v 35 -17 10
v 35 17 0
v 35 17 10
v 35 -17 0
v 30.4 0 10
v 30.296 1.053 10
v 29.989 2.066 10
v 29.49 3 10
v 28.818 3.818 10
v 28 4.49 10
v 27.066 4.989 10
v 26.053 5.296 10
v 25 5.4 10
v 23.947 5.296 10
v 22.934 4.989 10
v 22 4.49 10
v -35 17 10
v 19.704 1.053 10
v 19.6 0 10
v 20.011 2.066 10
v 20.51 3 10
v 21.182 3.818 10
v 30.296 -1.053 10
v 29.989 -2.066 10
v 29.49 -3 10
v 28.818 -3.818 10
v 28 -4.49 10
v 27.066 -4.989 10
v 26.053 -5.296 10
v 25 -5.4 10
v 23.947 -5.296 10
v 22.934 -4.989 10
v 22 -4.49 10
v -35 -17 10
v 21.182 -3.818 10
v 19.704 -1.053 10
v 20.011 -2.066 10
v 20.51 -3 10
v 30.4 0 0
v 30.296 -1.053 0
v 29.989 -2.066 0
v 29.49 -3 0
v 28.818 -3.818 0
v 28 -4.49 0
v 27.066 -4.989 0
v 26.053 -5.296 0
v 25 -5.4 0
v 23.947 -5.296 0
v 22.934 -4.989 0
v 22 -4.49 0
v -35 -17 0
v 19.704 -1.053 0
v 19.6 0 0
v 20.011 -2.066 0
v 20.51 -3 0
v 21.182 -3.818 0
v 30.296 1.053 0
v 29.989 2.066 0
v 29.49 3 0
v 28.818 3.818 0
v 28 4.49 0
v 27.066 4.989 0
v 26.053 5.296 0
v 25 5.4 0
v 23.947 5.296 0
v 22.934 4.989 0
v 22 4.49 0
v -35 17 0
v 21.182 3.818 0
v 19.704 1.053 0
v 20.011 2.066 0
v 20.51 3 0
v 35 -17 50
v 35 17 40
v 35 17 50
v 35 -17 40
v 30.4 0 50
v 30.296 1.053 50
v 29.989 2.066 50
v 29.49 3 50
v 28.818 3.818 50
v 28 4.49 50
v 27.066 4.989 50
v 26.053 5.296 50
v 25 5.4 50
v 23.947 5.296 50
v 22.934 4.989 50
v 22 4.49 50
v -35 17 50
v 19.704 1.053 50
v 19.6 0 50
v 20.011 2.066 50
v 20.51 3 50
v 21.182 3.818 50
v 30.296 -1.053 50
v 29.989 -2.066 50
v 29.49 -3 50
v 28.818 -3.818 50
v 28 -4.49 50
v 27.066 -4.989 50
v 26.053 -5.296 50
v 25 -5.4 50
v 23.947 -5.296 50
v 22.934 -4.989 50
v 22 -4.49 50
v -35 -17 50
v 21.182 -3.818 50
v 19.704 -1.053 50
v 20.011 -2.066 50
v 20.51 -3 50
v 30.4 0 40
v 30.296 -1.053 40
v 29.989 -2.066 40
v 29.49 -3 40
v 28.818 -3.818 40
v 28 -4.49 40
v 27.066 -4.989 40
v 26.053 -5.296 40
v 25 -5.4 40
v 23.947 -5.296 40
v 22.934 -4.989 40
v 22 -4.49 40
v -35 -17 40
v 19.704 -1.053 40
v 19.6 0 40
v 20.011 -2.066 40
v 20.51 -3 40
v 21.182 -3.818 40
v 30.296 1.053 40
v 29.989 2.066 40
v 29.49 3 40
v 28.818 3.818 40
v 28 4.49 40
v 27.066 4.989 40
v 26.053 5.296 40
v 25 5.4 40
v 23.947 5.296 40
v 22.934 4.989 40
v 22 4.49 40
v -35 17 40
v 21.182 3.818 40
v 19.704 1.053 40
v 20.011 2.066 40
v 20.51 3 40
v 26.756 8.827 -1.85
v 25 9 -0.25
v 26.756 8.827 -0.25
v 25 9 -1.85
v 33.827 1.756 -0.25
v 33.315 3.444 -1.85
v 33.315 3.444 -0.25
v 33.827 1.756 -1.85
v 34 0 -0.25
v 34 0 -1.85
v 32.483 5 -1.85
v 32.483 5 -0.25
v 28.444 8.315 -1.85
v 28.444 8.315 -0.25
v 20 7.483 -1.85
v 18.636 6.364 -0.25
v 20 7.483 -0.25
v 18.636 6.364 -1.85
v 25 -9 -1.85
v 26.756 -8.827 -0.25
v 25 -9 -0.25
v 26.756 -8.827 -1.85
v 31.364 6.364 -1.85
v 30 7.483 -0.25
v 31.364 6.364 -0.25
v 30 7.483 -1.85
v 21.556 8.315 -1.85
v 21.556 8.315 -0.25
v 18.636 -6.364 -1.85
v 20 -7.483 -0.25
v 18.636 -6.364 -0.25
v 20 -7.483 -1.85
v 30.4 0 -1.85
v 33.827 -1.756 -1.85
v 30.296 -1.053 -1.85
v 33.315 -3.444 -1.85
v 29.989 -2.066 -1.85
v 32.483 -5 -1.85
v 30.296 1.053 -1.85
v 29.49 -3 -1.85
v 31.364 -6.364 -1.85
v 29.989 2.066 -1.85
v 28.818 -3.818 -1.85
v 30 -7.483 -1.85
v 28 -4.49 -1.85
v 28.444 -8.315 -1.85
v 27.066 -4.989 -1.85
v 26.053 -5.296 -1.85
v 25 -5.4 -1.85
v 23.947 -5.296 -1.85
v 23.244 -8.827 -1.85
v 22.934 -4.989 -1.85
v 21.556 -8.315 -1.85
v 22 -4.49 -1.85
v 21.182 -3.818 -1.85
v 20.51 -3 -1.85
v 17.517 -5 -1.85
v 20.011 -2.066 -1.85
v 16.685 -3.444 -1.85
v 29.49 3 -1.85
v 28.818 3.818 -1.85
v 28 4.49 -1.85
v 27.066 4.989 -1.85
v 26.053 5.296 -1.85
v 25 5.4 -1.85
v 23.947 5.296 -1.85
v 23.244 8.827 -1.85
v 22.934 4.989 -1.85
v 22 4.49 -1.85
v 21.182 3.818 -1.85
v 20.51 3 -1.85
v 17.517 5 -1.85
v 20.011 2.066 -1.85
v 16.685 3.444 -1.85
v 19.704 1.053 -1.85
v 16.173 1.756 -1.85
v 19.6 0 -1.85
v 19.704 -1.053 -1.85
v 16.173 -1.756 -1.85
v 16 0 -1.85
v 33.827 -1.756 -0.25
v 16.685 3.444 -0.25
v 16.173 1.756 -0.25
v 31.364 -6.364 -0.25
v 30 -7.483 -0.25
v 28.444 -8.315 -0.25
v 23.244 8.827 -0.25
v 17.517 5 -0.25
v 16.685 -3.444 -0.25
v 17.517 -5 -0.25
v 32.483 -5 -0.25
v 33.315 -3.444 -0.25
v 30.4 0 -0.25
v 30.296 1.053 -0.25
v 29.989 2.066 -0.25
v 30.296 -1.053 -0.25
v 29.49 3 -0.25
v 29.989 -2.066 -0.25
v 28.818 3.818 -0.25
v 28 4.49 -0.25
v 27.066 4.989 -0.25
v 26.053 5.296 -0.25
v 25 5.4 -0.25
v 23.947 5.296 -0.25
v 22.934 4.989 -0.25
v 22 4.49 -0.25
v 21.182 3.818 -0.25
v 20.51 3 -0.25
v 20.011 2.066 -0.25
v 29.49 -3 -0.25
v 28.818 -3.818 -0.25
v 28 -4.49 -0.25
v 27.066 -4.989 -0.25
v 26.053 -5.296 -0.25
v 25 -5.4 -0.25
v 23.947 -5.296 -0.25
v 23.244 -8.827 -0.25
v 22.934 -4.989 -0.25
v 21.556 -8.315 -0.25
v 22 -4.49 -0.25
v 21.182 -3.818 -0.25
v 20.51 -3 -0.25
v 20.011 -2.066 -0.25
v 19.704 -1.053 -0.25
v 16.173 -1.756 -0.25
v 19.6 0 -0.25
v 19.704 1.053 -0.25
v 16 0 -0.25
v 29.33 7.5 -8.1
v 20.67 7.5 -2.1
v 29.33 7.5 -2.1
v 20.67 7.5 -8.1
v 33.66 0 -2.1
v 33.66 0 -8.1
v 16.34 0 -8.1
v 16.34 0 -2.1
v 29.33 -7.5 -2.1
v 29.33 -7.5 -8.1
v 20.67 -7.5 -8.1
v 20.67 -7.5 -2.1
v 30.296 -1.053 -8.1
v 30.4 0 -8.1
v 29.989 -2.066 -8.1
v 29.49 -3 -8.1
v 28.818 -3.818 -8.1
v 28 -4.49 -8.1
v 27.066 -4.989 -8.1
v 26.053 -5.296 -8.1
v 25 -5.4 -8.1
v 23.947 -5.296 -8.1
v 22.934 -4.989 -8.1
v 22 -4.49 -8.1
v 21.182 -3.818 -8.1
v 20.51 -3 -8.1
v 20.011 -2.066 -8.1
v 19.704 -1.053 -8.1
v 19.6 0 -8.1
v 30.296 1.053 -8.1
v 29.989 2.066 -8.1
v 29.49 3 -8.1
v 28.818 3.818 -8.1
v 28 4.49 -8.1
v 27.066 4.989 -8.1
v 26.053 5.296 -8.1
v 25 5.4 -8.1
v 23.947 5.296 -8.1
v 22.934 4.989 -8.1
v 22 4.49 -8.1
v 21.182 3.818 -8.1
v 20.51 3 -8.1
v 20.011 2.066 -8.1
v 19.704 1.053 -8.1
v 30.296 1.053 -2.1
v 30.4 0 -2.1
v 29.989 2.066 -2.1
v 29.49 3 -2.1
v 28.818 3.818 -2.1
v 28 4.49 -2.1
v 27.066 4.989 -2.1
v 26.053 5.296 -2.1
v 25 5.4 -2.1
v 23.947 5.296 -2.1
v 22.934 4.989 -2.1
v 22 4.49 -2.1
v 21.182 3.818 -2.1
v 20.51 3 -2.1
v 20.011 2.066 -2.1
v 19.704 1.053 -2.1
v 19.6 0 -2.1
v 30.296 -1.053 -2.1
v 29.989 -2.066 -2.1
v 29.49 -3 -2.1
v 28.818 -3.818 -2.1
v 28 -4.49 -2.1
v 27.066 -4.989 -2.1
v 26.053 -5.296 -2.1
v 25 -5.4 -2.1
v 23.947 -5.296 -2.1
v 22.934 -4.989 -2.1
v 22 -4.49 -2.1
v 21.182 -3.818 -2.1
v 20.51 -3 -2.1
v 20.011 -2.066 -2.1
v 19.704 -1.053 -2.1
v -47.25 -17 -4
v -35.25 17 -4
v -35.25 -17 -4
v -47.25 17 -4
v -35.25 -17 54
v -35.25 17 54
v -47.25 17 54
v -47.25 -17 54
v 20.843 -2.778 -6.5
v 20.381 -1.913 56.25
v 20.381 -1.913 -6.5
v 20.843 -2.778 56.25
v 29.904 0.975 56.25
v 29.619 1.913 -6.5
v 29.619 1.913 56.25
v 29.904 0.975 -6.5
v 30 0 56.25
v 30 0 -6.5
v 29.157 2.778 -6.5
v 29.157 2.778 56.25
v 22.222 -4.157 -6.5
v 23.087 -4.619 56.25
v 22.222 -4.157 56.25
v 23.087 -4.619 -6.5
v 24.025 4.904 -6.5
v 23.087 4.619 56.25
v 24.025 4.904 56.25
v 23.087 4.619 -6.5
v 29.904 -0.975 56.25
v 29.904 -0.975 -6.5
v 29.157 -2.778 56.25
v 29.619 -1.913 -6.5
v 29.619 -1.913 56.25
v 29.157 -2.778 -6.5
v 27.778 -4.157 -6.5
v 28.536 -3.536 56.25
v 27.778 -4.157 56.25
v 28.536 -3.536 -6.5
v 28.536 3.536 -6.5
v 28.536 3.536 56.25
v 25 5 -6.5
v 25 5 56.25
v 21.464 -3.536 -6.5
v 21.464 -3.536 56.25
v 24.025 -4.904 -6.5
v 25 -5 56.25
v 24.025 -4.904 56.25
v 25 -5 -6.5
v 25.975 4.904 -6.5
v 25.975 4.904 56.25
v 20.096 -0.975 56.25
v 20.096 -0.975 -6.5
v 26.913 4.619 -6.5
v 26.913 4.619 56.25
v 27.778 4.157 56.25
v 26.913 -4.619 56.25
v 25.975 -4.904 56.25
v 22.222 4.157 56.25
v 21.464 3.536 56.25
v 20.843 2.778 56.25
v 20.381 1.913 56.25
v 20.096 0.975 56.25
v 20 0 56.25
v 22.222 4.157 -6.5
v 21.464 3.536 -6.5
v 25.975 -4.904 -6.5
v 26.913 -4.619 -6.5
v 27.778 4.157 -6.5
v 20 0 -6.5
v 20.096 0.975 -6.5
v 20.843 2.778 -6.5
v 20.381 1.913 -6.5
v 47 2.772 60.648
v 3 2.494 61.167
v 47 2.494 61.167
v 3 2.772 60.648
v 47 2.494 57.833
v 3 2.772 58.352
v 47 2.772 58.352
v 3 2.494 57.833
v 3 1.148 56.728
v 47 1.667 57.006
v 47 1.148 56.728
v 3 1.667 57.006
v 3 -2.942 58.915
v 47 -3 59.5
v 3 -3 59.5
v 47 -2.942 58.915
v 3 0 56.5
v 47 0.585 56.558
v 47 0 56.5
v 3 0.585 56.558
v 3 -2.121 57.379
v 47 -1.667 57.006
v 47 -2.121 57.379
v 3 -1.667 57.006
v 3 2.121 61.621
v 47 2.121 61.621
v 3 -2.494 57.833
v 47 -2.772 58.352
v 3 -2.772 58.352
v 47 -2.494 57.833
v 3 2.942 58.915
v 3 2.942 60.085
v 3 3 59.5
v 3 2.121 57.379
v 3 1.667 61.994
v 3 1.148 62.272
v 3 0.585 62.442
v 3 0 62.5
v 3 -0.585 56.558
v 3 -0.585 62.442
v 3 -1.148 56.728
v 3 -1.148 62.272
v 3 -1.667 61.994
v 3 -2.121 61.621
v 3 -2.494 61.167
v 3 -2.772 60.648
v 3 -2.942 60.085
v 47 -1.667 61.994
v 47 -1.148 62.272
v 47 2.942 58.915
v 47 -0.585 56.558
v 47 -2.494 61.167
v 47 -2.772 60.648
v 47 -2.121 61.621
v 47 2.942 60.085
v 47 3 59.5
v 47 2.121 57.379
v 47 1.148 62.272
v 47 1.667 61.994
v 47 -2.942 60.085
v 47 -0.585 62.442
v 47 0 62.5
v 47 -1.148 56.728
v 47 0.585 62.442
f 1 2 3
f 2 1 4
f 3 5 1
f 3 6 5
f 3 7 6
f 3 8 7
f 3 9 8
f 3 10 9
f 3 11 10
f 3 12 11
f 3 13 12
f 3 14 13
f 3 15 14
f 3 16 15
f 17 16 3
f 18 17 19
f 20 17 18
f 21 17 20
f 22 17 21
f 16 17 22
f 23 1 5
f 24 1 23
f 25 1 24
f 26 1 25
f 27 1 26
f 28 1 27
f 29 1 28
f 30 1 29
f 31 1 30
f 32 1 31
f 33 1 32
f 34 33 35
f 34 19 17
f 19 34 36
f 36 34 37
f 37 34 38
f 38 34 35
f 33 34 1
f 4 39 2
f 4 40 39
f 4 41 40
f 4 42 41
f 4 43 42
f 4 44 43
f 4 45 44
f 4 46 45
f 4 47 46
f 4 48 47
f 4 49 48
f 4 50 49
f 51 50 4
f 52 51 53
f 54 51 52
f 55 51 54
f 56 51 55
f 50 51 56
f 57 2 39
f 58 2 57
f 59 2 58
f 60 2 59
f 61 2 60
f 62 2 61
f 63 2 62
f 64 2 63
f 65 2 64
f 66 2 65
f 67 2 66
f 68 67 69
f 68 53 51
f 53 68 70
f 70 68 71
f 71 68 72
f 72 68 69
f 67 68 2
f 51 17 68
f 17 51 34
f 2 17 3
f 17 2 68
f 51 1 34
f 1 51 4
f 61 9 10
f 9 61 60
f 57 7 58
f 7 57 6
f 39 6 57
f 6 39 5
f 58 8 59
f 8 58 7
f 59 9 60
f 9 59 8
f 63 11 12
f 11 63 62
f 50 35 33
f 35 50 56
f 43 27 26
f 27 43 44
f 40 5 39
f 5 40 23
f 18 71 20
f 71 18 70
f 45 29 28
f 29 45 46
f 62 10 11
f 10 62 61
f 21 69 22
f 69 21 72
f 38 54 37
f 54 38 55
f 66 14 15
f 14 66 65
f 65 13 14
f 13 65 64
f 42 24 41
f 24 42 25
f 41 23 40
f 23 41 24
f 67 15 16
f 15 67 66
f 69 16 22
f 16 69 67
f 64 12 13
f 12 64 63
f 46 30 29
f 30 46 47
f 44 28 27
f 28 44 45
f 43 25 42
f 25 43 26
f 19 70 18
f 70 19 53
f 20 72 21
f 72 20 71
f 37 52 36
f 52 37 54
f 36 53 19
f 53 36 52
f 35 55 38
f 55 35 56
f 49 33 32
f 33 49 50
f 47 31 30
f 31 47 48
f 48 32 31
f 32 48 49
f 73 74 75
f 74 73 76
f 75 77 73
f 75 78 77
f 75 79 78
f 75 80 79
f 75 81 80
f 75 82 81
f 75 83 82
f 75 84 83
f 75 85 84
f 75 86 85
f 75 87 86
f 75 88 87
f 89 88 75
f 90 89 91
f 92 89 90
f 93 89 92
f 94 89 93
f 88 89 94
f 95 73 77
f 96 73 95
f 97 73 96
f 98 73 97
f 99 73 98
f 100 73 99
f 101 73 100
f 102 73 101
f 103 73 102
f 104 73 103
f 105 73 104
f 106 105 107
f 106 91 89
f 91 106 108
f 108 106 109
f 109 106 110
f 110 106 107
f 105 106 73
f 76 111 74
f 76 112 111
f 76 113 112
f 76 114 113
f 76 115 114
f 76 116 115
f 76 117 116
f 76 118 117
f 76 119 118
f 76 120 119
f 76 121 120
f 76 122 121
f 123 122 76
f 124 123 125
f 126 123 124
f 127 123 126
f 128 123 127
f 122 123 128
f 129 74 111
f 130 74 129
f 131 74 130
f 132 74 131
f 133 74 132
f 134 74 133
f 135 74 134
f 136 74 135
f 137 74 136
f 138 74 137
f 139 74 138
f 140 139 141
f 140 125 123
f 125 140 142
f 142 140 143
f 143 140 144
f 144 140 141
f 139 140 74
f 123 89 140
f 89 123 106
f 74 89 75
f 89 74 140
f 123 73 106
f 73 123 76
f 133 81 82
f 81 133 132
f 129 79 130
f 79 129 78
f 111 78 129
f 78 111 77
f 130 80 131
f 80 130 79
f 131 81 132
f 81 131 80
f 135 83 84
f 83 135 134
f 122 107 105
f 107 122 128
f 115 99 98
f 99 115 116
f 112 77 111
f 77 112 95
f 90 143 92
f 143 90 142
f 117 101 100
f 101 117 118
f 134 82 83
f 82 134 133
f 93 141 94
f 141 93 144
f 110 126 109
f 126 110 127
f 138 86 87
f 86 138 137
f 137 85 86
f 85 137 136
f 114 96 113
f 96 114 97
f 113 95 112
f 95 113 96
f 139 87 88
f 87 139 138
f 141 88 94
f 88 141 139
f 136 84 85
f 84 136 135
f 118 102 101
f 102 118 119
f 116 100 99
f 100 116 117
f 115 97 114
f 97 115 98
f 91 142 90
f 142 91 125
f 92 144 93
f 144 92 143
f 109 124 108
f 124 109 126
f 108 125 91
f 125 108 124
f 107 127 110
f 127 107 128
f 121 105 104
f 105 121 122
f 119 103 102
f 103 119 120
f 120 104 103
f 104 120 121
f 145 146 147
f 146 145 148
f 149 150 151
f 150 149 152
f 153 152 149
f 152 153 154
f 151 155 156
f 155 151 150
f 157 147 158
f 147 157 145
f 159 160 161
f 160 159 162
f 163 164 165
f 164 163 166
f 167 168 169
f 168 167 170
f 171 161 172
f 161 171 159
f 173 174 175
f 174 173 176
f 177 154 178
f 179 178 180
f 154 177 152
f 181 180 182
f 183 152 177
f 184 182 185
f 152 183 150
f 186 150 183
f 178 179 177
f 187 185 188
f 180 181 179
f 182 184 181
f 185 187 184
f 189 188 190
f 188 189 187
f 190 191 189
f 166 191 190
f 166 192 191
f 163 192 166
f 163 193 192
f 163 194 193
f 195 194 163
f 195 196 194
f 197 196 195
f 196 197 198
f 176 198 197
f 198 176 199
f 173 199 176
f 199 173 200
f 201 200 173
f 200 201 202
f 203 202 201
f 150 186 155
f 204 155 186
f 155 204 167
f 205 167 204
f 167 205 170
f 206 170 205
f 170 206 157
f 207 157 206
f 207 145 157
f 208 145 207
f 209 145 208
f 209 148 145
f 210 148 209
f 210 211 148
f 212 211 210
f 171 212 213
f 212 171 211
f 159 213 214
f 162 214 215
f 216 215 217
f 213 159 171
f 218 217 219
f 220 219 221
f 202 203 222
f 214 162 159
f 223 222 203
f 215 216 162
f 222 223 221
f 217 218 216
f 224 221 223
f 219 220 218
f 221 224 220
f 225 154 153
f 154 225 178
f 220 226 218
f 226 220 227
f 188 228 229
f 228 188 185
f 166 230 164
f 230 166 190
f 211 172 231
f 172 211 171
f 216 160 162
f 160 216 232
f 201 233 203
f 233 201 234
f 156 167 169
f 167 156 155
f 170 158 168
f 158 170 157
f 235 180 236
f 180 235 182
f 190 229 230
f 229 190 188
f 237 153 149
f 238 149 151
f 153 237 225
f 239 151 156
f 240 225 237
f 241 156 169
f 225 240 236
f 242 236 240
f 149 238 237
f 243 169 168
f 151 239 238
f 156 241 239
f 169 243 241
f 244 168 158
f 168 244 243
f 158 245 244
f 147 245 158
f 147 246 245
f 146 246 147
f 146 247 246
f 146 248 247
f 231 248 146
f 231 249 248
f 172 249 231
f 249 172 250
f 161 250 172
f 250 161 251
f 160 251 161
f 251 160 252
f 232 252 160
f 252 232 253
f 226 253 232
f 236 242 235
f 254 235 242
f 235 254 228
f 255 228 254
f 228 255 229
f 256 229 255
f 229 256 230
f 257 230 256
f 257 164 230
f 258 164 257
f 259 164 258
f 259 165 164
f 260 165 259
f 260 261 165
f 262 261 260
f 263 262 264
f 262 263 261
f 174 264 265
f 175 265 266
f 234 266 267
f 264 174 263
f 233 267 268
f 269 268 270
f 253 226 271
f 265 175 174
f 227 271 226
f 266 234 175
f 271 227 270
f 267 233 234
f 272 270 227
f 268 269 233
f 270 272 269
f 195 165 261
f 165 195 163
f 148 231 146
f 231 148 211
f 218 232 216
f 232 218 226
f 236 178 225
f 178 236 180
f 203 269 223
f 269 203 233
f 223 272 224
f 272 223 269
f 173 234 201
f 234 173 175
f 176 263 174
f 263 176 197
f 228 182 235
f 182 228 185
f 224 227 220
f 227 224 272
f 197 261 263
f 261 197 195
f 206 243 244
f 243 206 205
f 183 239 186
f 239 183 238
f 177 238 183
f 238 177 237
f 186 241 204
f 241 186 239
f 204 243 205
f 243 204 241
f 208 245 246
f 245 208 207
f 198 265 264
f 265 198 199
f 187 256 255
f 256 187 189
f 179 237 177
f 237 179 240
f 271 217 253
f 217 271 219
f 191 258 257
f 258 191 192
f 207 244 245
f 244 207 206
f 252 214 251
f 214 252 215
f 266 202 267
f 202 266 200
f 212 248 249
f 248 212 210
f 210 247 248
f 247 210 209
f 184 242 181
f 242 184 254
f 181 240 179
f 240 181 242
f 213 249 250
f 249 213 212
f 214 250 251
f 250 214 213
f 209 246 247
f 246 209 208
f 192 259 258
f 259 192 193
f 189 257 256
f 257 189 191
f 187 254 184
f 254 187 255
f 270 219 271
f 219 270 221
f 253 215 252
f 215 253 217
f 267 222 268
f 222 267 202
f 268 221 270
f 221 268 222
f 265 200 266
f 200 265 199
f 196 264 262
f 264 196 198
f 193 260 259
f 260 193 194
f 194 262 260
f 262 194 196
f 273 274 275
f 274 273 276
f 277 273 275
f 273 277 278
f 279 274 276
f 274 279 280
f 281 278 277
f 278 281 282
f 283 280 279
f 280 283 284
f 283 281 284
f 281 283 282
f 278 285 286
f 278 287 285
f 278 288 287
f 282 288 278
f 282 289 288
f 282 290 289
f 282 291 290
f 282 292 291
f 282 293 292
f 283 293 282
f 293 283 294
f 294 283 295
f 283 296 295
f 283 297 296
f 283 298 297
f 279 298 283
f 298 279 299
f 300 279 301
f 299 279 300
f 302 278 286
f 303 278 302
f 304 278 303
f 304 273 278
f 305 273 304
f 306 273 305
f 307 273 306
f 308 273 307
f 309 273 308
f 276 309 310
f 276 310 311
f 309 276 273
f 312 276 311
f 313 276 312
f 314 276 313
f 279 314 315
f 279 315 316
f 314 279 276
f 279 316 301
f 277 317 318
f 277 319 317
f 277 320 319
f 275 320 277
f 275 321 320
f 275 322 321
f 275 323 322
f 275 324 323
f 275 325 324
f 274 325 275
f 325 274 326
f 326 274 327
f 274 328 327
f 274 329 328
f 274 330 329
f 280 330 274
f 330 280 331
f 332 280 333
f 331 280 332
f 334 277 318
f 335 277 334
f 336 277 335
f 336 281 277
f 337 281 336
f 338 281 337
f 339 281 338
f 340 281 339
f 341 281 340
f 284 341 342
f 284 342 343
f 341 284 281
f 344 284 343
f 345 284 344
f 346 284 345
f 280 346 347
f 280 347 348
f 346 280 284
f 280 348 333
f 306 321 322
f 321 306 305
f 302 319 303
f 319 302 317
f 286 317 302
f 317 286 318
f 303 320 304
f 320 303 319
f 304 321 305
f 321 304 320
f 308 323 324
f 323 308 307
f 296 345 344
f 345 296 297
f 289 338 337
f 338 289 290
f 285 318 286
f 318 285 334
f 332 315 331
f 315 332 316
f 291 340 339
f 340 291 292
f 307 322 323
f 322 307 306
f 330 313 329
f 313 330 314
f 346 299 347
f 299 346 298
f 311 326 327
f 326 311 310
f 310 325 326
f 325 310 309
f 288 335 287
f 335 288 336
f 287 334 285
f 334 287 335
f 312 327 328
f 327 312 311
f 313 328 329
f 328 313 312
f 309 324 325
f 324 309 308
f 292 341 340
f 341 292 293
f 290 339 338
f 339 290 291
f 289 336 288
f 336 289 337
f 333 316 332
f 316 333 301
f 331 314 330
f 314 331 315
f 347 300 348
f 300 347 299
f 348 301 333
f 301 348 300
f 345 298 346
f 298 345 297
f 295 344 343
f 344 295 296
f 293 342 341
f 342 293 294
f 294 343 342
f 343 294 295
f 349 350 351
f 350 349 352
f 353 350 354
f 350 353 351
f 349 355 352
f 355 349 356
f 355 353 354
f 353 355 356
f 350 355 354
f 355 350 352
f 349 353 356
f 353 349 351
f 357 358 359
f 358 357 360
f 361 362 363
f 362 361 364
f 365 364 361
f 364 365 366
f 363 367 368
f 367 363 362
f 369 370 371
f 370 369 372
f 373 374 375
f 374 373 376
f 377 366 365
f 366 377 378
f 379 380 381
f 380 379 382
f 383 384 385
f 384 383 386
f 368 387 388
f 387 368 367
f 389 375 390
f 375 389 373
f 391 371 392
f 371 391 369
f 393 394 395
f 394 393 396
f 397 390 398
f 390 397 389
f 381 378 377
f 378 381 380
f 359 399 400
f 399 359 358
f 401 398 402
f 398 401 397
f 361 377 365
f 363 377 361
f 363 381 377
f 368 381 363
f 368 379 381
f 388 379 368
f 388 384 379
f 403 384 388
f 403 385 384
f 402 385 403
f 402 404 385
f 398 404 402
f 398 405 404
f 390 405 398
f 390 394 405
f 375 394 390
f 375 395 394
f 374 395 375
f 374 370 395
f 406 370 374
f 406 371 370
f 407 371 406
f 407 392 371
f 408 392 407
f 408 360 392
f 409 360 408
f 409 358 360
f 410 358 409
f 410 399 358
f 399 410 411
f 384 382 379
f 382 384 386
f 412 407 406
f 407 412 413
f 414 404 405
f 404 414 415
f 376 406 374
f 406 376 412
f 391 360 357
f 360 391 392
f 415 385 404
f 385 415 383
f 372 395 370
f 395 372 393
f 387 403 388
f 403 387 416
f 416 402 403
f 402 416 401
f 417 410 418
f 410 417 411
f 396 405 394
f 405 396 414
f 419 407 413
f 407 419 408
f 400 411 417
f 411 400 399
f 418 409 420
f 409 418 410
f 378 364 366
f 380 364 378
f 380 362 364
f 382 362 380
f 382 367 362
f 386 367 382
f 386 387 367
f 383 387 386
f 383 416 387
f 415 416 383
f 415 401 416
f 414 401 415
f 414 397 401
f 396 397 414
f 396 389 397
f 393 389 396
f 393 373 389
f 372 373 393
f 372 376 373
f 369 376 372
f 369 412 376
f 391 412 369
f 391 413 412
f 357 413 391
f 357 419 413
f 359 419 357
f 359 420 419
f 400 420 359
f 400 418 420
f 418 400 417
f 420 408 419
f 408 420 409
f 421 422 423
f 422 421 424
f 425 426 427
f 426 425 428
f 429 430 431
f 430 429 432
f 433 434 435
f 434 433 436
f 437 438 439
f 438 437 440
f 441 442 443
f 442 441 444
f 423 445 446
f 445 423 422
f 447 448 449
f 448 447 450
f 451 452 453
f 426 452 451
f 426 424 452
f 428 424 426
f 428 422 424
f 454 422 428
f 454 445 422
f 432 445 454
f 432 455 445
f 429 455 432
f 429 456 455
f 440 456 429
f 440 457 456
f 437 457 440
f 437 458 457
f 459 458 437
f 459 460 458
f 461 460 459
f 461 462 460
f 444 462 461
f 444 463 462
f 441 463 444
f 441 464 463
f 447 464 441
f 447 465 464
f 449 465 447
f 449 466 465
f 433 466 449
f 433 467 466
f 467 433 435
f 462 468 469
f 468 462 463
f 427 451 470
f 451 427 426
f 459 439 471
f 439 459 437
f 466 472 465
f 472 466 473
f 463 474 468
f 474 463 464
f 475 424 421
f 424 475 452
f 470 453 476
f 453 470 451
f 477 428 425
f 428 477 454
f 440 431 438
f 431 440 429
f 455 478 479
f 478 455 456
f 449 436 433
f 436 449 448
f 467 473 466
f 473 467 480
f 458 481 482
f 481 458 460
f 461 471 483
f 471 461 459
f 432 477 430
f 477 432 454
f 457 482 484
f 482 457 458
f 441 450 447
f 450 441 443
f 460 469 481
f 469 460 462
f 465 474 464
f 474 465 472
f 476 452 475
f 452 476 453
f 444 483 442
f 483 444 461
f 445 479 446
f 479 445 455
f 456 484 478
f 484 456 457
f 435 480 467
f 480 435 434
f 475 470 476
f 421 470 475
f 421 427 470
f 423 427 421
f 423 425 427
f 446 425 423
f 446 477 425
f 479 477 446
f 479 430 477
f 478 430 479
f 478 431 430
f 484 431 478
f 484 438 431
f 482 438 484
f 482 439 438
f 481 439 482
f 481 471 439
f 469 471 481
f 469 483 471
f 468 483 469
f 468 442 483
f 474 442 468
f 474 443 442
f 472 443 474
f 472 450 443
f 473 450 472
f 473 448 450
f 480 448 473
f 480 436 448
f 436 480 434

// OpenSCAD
$fn = 32;

// ------------------------------------------------------------------------
// C clamp: throat 40 mm, screw d10
// Every part is its own module, assembly() places every instance.
// ------------------------------------------------------------------------

// --- part 1 ---
module clamp_arm() {
  difference() {
    translate([-35, -17, 0]) cube([70, 34, 10]);
    translate([25, 0, -1]) cylinder(h = 12, d = 10.8);
  }
}

// --- part 2 ---
module clamp_spine() {
  difference() {
    translate([-29, -17, 0]) cube([58, 34, 12]);
  }
}

// --- part 3 ---
module clamp_screw() {
  translate([0, 0, -31.375]) cylinder(h = 62.75, d = 10);
}

// --- part 4 ---
module clamp_washer() {
  difference() {
      translate([0, 0, 0]) cylinder(h = 1.6, d = 18);
      translate([0, 0, -1]) cylinder(h = 3.6, d = 10.8);
    }
}

// --- part 5 ---
module clamp_nut() {
  difference() {
    linear_extrude(height = 6) polygon(points = [[8.66, 0], [4.33, 7.5], [-4.33, 7.5], [-8.66, 0], [-4.33, -7.5], [4.33, -7.5]]);
    translate([0, 0, -1]) cylinder(h = 8, d = 10.8);
  }
}

// --- part 6 ---
module tommy_bar() {
  translate([0, 0, -22]) cylinder(h = 44, d = 6);
}

// --- assembly ---
module assembly() {
  color([0.80, 0.24, 0.20]) translate([0, 0, 0]) rotate([0, 0, 0]) clamp_arm();
  color([0.20, 0.45, 0.75]) translate([0, 0, 40]) rotate([0, 0, 0]) clamp_arm();
  color([0.25, 0.62, 0.32]) translate([-47.25, 0, 25]) rotate([0, 90, 0]) clamp_spine();
  color([0.92, 0.70, 0.18]) translate([25, 0, 24.875]) rotate([0, 0, 0]) clamp_screw();
  color([0.58, 0.35, 0.70]) translate([25, 0, -1.85]) rotate([0, 0, 0]) clamp_washer();
  color([0.16, 0.66, 0.66]) translate([25, 0, -8.1]) rotate([0, 0, 0]) clamp_nut();
  color([0.85, 0.48, 0.18]) translate([25, 0, 59.5]) rotate([0, 90, 0]) tommy_bar();
}

assembly();
